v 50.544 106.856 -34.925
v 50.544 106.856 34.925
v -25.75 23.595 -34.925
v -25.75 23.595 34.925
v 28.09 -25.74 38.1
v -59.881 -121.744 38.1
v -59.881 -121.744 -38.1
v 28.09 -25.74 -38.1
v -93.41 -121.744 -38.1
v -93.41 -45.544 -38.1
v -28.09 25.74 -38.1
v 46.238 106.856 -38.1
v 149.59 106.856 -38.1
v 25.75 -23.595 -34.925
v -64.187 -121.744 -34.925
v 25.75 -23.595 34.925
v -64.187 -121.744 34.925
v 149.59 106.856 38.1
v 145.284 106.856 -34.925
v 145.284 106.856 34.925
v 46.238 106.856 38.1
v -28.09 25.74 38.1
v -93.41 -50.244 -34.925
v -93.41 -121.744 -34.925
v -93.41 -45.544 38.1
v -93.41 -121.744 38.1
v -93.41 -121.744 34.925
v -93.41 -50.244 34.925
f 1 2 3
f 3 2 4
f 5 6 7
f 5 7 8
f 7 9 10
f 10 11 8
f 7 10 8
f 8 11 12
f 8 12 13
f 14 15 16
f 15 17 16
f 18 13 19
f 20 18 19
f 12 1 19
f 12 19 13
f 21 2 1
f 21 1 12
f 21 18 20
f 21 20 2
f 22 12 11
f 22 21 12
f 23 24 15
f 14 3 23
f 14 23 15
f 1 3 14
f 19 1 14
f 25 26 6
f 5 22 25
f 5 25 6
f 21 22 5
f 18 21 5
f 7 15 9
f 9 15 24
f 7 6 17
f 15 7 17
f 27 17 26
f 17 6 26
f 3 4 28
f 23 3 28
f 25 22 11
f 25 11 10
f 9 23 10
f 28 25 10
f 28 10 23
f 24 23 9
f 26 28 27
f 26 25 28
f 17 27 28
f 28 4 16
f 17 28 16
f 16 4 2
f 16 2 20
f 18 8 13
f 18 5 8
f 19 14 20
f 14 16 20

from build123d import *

# Parameters (mm, degrees)
BOSS_EXTRUDE1_DEPTH = 38.1
SHELL1_T            = -3.175
CUT_EXTRUDE6_DEPTH  = 76.2


with BuildPart() as part:
    # Sketch2 → Boss-Extrude1 (new, symmetric)
    with BuildSketch(Plane.XY):
        Polygon((46.237705824, 106.855650642), (-28.090411256, 25.739828971), (28.090411256, -25.739828971), (149.590411256, 106.855650642), align=None)
        Polygon((-28.090411256, 25.739828971), (-93.409588744, -45.544349358), (-93.409588744, -158.335308585), (28.090411256, -25.739828971), align=None)
    extrude(amount=BOSS_EXTRUDE1_DEPTH, both=True)

    # Shell1
    shell1_openings = [part.faces().sort_by_distance(p)[0] for p in [
        (97.91405854, 106.855650642, 0),
        (-93.409588744, -101.939828971, 0),
    ]]
    offset(amount=SHELL1_T, openings=shell1_openings, kind=Kind.INTERSECTION)

    # Sketch3 → Cut-Extrude6 (cut)
    with BuildSketch(Plane.XY.offset(38.1)):
        Polygon((-59.880530596, -121.744349358), (-93.409588744, -121.744349358), (-93.409588744, -158.335308585), align=None)
    extrude(amount=-CUT_EXTRUDE6_DEPTH, mode=Mode.SUBTRACT)


solid = part.part
